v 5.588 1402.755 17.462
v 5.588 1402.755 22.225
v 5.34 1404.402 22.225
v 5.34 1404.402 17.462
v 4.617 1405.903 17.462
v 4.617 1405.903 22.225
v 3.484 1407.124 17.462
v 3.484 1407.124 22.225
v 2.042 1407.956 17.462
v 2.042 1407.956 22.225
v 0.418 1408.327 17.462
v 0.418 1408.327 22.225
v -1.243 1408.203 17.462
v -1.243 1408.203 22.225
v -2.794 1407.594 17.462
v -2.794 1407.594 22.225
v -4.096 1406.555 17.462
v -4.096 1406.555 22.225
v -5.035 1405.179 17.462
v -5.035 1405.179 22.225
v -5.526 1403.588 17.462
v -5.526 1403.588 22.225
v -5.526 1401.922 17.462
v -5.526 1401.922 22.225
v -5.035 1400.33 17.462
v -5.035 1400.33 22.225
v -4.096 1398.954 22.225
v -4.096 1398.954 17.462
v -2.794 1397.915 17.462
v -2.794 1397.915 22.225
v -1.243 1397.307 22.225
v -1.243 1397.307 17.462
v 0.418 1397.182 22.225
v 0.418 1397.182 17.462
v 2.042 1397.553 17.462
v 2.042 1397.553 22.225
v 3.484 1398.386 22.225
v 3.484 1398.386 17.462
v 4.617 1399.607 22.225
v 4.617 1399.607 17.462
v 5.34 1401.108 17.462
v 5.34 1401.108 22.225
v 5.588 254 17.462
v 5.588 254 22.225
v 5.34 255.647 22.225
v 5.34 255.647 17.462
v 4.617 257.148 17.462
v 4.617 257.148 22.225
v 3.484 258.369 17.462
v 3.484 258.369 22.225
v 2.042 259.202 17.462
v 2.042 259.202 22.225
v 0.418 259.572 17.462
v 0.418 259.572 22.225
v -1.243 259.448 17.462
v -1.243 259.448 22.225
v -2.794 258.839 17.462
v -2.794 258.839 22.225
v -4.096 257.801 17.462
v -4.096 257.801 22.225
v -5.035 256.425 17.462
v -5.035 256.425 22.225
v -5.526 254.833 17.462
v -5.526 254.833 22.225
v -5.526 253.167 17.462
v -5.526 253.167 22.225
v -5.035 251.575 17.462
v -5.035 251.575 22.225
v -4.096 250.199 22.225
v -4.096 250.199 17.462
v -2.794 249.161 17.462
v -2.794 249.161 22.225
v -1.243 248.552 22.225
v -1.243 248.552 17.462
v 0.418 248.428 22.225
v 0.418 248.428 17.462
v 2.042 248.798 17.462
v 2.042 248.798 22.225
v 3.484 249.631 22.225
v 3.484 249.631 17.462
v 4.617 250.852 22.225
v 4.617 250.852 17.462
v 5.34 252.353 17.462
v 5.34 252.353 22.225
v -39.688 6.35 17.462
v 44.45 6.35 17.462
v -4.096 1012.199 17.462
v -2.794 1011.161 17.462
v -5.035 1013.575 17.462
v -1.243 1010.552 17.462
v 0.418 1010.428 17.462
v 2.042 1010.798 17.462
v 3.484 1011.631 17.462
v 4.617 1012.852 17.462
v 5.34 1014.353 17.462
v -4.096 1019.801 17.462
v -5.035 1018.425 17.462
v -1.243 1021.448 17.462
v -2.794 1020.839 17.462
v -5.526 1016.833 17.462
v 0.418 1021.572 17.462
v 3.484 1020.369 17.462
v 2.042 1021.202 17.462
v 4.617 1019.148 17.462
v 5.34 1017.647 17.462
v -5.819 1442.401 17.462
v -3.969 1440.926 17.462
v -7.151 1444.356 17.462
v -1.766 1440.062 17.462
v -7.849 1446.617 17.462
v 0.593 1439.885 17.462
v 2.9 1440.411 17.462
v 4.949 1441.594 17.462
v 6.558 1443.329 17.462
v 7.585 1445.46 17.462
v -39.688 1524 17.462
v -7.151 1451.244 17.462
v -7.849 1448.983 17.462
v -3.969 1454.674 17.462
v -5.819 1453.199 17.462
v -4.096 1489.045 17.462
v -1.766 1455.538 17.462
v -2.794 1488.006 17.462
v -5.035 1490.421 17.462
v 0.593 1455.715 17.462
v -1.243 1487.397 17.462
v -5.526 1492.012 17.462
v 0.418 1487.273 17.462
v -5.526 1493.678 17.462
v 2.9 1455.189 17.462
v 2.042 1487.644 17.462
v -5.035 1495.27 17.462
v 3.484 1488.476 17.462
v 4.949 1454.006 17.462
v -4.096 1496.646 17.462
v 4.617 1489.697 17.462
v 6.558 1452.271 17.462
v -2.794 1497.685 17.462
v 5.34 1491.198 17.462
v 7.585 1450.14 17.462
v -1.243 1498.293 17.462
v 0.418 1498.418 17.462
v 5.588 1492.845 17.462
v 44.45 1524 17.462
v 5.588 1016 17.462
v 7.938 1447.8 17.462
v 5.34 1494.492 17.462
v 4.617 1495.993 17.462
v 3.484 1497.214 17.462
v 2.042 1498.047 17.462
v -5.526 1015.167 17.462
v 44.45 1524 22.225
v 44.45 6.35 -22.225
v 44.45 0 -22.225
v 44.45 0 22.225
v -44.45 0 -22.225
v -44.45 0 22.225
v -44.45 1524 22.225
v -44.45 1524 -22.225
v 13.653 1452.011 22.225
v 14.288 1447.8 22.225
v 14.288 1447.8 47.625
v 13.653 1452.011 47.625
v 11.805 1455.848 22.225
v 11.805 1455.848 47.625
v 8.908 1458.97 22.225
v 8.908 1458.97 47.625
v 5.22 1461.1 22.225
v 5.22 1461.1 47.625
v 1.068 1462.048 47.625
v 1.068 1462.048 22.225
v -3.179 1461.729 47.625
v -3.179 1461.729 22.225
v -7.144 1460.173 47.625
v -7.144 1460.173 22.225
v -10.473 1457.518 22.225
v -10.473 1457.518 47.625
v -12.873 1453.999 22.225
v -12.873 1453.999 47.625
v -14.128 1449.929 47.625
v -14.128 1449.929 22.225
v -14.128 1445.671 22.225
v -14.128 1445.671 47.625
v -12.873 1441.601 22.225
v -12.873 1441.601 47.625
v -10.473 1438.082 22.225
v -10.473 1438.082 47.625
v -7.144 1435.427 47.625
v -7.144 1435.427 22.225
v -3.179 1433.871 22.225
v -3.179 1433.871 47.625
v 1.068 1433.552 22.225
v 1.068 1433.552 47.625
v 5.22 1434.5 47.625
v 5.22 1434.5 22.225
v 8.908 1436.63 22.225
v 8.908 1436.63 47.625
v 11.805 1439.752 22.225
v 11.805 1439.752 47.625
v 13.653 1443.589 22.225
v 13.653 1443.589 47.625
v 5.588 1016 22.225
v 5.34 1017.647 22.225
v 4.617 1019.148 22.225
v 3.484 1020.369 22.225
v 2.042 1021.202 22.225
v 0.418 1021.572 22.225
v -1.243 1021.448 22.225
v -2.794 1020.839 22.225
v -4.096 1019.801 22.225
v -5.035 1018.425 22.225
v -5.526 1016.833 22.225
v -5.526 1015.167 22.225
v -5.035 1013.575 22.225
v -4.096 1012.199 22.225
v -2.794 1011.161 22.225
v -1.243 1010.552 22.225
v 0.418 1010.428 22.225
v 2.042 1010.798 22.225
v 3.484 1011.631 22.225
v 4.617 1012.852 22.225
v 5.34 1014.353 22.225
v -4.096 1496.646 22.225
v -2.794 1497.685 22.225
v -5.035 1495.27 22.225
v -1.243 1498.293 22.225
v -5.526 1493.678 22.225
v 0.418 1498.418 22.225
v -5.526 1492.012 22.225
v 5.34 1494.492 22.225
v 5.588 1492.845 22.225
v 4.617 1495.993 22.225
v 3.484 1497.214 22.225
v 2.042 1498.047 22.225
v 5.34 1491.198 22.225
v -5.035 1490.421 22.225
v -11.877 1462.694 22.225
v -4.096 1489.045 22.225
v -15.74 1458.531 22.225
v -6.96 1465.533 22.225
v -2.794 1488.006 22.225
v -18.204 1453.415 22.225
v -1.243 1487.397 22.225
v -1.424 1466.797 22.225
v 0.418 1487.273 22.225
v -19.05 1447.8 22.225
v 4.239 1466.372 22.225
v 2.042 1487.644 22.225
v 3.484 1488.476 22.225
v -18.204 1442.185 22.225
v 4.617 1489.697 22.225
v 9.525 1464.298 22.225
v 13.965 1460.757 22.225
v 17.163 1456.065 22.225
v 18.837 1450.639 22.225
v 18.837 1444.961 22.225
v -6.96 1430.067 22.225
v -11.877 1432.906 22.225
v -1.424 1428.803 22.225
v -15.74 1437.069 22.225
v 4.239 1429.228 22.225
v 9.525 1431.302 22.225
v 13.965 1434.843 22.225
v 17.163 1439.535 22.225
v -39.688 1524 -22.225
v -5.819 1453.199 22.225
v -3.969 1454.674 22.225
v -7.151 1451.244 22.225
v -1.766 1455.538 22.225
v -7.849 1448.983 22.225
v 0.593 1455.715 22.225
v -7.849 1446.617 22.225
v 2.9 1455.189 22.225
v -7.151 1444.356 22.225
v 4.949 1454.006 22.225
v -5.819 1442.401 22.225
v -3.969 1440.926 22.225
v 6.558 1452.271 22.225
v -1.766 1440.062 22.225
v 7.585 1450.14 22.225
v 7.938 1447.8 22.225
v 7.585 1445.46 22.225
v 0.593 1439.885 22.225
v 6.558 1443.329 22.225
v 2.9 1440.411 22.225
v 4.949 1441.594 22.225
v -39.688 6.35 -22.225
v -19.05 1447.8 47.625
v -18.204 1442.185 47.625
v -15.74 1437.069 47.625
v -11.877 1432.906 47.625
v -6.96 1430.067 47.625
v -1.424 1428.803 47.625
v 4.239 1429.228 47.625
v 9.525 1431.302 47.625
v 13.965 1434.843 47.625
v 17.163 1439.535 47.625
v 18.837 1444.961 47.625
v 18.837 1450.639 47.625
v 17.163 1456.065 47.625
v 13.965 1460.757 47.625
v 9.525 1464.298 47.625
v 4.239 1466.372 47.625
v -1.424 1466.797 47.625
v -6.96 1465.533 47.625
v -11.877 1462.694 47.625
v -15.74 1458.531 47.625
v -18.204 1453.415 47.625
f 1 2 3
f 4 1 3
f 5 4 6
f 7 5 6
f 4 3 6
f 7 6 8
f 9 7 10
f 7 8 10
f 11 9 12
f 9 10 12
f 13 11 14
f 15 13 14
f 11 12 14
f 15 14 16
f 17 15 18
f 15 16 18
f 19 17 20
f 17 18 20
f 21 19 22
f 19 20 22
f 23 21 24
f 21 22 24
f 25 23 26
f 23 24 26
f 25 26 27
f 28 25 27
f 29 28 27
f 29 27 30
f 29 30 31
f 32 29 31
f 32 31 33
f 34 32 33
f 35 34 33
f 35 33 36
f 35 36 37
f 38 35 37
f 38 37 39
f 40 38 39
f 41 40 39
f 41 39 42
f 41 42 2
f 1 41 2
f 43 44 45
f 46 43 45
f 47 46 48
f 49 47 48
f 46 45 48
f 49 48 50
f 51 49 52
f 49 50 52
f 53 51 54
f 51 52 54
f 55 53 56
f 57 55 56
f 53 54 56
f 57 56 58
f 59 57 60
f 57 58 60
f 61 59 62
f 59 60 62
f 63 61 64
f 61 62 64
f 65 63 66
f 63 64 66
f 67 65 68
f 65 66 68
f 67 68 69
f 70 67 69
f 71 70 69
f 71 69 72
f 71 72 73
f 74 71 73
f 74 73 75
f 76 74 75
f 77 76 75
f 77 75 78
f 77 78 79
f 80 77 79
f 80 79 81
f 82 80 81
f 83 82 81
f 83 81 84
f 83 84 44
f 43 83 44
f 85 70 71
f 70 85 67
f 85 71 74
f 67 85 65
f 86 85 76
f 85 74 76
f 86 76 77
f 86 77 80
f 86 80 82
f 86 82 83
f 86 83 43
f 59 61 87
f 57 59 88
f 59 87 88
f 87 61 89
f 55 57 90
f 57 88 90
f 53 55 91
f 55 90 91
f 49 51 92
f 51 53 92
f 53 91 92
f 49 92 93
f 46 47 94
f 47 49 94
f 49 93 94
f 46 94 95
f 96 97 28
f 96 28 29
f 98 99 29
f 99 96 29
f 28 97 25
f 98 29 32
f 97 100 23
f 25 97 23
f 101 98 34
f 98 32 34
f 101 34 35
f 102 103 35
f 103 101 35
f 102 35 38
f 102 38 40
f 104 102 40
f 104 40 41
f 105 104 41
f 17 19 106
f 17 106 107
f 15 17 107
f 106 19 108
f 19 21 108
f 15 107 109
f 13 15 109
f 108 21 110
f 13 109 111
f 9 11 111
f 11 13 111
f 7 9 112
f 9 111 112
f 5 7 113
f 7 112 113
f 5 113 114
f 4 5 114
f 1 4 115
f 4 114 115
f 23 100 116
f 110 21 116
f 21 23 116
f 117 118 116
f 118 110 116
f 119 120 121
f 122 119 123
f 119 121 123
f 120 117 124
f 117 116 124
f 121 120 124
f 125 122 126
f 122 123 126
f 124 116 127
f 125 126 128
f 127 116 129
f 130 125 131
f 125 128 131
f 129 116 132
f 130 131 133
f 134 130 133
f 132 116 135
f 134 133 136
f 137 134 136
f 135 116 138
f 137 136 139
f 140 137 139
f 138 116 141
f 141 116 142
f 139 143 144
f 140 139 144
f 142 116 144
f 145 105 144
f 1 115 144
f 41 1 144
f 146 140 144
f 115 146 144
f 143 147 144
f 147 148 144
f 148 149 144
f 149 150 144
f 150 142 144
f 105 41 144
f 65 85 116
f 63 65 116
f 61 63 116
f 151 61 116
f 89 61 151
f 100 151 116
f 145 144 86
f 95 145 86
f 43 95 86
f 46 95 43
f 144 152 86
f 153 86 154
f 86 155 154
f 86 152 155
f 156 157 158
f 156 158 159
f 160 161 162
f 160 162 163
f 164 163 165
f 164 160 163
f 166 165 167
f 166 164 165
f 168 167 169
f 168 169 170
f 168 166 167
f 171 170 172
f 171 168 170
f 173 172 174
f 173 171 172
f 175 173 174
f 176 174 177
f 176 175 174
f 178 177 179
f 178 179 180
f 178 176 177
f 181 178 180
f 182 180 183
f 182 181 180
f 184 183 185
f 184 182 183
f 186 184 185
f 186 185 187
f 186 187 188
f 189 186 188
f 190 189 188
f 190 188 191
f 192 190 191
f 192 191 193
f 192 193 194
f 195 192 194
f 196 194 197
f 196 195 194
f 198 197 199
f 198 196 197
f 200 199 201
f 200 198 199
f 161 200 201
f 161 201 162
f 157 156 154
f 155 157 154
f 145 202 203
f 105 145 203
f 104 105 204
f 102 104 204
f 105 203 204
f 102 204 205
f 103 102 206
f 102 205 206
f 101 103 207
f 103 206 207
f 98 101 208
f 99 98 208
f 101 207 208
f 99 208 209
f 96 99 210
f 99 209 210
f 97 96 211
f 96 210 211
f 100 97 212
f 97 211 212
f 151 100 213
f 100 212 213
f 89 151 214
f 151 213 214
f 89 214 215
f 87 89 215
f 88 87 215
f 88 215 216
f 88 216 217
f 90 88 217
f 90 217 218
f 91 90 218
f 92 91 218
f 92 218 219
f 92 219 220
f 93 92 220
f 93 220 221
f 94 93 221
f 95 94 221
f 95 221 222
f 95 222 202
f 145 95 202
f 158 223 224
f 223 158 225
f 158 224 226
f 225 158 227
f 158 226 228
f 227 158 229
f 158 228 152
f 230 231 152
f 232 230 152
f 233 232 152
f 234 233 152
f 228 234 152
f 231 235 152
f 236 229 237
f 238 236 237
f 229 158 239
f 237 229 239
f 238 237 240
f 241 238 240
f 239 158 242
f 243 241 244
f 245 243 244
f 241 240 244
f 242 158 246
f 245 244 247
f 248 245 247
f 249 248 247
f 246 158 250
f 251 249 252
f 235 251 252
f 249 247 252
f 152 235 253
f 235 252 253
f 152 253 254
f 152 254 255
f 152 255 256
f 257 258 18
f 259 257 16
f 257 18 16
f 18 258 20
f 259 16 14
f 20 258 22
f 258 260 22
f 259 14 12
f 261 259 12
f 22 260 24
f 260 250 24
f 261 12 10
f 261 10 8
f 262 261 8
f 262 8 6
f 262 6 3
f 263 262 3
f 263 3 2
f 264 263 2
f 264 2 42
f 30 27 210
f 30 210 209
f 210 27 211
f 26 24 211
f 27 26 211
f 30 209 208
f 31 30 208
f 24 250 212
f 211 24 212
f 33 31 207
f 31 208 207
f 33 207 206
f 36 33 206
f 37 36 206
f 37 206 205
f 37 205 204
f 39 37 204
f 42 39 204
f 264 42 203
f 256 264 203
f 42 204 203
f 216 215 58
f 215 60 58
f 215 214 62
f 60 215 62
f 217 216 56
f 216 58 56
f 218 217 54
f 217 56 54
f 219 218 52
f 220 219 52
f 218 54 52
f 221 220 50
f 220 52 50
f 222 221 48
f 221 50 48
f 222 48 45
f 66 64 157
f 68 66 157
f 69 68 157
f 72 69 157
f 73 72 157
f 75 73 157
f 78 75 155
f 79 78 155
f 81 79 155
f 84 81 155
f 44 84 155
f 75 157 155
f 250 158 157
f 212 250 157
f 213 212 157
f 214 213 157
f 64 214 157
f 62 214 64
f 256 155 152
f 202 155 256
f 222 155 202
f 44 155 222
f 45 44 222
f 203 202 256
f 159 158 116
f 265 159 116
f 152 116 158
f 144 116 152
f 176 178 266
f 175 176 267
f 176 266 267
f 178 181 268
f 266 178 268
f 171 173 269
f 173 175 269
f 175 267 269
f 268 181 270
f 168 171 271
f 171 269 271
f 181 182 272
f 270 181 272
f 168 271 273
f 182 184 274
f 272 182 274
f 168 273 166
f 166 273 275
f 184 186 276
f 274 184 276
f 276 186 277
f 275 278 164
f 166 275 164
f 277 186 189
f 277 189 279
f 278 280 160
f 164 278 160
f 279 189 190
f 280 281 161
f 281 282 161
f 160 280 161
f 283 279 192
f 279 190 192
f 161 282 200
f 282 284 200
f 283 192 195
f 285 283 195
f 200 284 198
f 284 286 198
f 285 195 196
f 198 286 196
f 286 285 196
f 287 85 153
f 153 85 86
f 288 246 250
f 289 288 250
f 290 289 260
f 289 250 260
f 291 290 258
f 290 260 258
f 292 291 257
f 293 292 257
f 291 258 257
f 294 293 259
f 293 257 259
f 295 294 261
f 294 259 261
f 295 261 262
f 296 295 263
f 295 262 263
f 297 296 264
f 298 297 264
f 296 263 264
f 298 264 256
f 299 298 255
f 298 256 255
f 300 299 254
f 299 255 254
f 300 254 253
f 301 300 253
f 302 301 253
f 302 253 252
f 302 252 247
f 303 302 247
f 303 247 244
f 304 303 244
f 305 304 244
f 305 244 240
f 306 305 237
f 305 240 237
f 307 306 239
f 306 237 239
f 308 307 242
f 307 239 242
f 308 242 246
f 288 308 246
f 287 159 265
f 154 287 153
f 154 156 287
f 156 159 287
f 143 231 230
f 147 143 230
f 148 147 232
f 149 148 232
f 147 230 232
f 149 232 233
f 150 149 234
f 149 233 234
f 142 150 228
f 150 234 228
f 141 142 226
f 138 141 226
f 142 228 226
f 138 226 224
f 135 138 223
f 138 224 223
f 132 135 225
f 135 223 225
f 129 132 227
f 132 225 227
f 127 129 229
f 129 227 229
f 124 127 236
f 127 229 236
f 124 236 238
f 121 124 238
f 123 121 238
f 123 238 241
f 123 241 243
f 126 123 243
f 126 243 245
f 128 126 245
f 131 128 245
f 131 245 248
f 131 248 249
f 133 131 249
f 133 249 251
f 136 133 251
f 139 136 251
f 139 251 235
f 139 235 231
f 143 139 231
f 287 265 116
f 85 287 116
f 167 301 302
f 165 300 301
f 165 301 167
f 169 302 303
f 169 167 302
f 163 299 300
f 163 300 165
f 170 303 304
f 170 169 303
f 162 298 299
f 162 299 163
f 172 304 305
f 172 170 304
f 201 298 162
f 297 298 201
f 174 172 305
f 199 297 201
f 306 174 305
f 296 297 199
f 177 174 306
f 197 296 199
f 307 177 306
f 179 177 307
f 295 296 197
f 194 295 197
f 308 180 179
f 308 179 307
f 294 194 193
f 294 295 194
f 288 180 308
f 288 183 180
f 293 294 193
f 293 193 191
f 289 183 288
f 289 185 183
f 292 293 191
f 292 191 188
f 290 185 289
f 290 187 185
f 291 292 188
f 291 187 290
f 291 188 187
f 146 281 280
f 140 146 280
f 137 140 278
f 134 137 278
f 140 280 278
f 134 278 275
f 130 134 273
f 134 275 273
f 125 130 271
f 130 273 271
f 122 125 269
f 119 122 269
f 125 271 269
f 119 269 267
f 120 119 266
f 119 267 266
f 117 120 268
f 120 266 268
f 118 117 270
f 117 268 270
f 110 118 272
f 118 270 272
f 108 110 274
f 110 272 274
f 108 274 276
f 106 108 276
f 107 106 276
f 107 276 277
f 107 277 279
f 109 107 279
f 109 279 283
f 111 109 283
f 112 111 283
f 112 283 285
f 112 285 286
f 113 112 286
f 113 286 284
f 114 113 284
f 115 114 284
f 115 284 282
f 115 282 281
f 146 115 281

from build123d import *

# Parameters (mm, degrees)
SKETCH1_W           = 88.9
SKETCH1_H           = 44.45
BOSS_EXTRUDE1_DEPTH = 1524
CUT_EXTRUDE1_REACH  = 1527.296
SKETCH2_R           = 7.9375
SKETCH2_R_2         = 5.588
SKETCH4_R           = 19.05
SKETCH4_R_2         = 14.2875
BOSS_EXTRUDE2_DEPTH = 25.4
CUT_EXTRUDE3_REACH  = 1527.392
SKETCH7_W           = 88.9
SKETCH7_H           = 44.45
BOSS_EXTRUDE3_DEPTH = 6.35


with BuildPart() as part:
    # Sketch1 → Boss-Extrude1 (new body)
    with BuildSketch(Plane(origin=(0, 0, 0), x_dir=(1, 0, 0), z_dir=(0, 1, 0))):
        Rectangle(SKETCH1_W, SKETCH1_H)
    extrude(amount=BOSS_EXTRUDE1_DEPTH)

    # Sketch2 → Cut-Extrude1 (cut, up to next)
    with BuildSketch(Plane.XY.offset(22.225), mode=Mode.PRIVATE) as cut_extrude1_sk1:
        with Locations((0, 1447.8)):
            Circle(SKETCH2_R)
    cut_extrude1_tool1 = extrude(cut_extrude1_sk1.sketch, amount=-CUT_EXTRUDE1_REACH, mode=Mode.PRIVATE) & part.part
    # Sketch2 → Cut-Extrude1 (cut, up to next)
    with BuildSketch(Plane.XY.offset(22.225), mode=Mode.PRIVATE) as cut_extrude1_sk2:
        with Locations((0, 1016)):
            Circle(SKETCH2_R_2)
    cut_extrude1_tool2 = extrude(cut_extrude1_sk2.sketch, amount=-CUT_EXTRUDE1_REACH, mode=Mode.PRIVATE) & part.part
    # Sketch2 → Cut-Extrude1 (cut, up to next)
    with BuildSketch(Plane.XY.offset(22.225), mode=Mode.PRIVATE) as cut_extrude1_sk3:
        with Locations((0, 254)):
            Circle(SKETCH2_R_2)
    cut_extrude1_tool3 = extrude(cut_extrude1_sk3.sketch, amount=-CUT_EXTRUDE1_REACH, mode=Mode.PRIVATE) & part.part
    # Sketch2 → Cut-Extrude1 (cut, up to next)
    with BuildSketch(Plane.XY.offset(22.225), mode=Mode.PRIVATE) as cut_extrude1_sk4:
        with Locations((0, 1492.8453125)):
            Circle(SKETCH2_R_2)
    cut_extrude1_tool4 = extrude(cut_extrude1_sk4.sketch, amount=-CUT_EXTRUDE1_REACH, mode=Mode.PRIVATE) & part.part
    # Sketch2 → Cut-Extrude1 (cut, up to next)
    with BuildSketch(Plane.XY.offset(22.225), mode=Mode.PRIVATE) as cut_extrude1_sk5:
        with Locations((0, 1402.7546875)):
            Circle(SKETCH2_R_2)
    cut_extrude1_tool5 = extrude(cut_extrude1_sk5.sketch, amount=-CUT_EXTRUDE1_REACH, mode=Mode.PRIVATE) & part.part
    add(cut_extrude1_tool1.solids().sort_by_distance((0, 1447.8, 22.225))[0], mode=Mode.SUBTRACT)
    add(cut_extrude1_tool2.solids().sort_by_distance((0, 1016, 22.225))[0], mode=Mode.SUBTRACT)
    add(cut_extrude1_tool3.solids().sort_by_distance((0, 254, 22.225))[0], mode=Mode.SUBTRACT)
    add(cut_extrude1_tool4.solids().sort_by_distance((0, 1492.845313, 22.225))[0], mode=Mode.SUBTRACT)
    add(cut_extrude1_tool5.solids().sort_by_distance((0, 1402.754687, 22.225))[0], mode=Mode.SUBTRACT)

    # Sketch4 → Boss-Extrude2 (add)
    with BuildSketch(Plane.XY.offset(22.225)):
        with Locations(Location((0, 1447.8, 0), (0, 0, 180))):
            Circle(SKETCH4_R)
        with Locations((0, 1447.8)):
            Circle(SKETCH4_R_2, mode=Mode.SUBTRACT)
    extrude(amount=BOSS_EXTRUDE2_DEPTH)

    # Sketch5 → Cut-Extrude3 (cut, up to next)
    with BuildSketch(Plane(origin=(0, 1524, 0), x_dir=(1, 0, 0), z_dir=(0, 1, 0)), mode=Mode.PRIVATE) as cut_extrude3_sk1:
        Polygon((-39.6875, 17.4625), (-39.6875, 22.225), (44.45, 22.225), (44.45, -17.4625), (39.6875, -17.4625), (-39.6875, -17.4625), align=None)
    cut_extrude3_tool1 = extrude(cut_extrude3_sk1.sketch, amount=-CUT_EXTRUDE3_REACH, mode=Mode.PRIVATE) & part.part
    add(cut_extrude3_tool1.solids().sort_by_distance((2.38125, 1524, -2.38125))[0], mode=Mode.SUBTRACT)

    # Sketch7 → Boss-Extrude3 (add)
    with BuildSketch(Plane.XZ):
        Rectangle(SKETCH7_W, SKETCH7_H)
    extrude(amount=-BOSS_EXTRUDE3_DEPTH)


solid = part.part
